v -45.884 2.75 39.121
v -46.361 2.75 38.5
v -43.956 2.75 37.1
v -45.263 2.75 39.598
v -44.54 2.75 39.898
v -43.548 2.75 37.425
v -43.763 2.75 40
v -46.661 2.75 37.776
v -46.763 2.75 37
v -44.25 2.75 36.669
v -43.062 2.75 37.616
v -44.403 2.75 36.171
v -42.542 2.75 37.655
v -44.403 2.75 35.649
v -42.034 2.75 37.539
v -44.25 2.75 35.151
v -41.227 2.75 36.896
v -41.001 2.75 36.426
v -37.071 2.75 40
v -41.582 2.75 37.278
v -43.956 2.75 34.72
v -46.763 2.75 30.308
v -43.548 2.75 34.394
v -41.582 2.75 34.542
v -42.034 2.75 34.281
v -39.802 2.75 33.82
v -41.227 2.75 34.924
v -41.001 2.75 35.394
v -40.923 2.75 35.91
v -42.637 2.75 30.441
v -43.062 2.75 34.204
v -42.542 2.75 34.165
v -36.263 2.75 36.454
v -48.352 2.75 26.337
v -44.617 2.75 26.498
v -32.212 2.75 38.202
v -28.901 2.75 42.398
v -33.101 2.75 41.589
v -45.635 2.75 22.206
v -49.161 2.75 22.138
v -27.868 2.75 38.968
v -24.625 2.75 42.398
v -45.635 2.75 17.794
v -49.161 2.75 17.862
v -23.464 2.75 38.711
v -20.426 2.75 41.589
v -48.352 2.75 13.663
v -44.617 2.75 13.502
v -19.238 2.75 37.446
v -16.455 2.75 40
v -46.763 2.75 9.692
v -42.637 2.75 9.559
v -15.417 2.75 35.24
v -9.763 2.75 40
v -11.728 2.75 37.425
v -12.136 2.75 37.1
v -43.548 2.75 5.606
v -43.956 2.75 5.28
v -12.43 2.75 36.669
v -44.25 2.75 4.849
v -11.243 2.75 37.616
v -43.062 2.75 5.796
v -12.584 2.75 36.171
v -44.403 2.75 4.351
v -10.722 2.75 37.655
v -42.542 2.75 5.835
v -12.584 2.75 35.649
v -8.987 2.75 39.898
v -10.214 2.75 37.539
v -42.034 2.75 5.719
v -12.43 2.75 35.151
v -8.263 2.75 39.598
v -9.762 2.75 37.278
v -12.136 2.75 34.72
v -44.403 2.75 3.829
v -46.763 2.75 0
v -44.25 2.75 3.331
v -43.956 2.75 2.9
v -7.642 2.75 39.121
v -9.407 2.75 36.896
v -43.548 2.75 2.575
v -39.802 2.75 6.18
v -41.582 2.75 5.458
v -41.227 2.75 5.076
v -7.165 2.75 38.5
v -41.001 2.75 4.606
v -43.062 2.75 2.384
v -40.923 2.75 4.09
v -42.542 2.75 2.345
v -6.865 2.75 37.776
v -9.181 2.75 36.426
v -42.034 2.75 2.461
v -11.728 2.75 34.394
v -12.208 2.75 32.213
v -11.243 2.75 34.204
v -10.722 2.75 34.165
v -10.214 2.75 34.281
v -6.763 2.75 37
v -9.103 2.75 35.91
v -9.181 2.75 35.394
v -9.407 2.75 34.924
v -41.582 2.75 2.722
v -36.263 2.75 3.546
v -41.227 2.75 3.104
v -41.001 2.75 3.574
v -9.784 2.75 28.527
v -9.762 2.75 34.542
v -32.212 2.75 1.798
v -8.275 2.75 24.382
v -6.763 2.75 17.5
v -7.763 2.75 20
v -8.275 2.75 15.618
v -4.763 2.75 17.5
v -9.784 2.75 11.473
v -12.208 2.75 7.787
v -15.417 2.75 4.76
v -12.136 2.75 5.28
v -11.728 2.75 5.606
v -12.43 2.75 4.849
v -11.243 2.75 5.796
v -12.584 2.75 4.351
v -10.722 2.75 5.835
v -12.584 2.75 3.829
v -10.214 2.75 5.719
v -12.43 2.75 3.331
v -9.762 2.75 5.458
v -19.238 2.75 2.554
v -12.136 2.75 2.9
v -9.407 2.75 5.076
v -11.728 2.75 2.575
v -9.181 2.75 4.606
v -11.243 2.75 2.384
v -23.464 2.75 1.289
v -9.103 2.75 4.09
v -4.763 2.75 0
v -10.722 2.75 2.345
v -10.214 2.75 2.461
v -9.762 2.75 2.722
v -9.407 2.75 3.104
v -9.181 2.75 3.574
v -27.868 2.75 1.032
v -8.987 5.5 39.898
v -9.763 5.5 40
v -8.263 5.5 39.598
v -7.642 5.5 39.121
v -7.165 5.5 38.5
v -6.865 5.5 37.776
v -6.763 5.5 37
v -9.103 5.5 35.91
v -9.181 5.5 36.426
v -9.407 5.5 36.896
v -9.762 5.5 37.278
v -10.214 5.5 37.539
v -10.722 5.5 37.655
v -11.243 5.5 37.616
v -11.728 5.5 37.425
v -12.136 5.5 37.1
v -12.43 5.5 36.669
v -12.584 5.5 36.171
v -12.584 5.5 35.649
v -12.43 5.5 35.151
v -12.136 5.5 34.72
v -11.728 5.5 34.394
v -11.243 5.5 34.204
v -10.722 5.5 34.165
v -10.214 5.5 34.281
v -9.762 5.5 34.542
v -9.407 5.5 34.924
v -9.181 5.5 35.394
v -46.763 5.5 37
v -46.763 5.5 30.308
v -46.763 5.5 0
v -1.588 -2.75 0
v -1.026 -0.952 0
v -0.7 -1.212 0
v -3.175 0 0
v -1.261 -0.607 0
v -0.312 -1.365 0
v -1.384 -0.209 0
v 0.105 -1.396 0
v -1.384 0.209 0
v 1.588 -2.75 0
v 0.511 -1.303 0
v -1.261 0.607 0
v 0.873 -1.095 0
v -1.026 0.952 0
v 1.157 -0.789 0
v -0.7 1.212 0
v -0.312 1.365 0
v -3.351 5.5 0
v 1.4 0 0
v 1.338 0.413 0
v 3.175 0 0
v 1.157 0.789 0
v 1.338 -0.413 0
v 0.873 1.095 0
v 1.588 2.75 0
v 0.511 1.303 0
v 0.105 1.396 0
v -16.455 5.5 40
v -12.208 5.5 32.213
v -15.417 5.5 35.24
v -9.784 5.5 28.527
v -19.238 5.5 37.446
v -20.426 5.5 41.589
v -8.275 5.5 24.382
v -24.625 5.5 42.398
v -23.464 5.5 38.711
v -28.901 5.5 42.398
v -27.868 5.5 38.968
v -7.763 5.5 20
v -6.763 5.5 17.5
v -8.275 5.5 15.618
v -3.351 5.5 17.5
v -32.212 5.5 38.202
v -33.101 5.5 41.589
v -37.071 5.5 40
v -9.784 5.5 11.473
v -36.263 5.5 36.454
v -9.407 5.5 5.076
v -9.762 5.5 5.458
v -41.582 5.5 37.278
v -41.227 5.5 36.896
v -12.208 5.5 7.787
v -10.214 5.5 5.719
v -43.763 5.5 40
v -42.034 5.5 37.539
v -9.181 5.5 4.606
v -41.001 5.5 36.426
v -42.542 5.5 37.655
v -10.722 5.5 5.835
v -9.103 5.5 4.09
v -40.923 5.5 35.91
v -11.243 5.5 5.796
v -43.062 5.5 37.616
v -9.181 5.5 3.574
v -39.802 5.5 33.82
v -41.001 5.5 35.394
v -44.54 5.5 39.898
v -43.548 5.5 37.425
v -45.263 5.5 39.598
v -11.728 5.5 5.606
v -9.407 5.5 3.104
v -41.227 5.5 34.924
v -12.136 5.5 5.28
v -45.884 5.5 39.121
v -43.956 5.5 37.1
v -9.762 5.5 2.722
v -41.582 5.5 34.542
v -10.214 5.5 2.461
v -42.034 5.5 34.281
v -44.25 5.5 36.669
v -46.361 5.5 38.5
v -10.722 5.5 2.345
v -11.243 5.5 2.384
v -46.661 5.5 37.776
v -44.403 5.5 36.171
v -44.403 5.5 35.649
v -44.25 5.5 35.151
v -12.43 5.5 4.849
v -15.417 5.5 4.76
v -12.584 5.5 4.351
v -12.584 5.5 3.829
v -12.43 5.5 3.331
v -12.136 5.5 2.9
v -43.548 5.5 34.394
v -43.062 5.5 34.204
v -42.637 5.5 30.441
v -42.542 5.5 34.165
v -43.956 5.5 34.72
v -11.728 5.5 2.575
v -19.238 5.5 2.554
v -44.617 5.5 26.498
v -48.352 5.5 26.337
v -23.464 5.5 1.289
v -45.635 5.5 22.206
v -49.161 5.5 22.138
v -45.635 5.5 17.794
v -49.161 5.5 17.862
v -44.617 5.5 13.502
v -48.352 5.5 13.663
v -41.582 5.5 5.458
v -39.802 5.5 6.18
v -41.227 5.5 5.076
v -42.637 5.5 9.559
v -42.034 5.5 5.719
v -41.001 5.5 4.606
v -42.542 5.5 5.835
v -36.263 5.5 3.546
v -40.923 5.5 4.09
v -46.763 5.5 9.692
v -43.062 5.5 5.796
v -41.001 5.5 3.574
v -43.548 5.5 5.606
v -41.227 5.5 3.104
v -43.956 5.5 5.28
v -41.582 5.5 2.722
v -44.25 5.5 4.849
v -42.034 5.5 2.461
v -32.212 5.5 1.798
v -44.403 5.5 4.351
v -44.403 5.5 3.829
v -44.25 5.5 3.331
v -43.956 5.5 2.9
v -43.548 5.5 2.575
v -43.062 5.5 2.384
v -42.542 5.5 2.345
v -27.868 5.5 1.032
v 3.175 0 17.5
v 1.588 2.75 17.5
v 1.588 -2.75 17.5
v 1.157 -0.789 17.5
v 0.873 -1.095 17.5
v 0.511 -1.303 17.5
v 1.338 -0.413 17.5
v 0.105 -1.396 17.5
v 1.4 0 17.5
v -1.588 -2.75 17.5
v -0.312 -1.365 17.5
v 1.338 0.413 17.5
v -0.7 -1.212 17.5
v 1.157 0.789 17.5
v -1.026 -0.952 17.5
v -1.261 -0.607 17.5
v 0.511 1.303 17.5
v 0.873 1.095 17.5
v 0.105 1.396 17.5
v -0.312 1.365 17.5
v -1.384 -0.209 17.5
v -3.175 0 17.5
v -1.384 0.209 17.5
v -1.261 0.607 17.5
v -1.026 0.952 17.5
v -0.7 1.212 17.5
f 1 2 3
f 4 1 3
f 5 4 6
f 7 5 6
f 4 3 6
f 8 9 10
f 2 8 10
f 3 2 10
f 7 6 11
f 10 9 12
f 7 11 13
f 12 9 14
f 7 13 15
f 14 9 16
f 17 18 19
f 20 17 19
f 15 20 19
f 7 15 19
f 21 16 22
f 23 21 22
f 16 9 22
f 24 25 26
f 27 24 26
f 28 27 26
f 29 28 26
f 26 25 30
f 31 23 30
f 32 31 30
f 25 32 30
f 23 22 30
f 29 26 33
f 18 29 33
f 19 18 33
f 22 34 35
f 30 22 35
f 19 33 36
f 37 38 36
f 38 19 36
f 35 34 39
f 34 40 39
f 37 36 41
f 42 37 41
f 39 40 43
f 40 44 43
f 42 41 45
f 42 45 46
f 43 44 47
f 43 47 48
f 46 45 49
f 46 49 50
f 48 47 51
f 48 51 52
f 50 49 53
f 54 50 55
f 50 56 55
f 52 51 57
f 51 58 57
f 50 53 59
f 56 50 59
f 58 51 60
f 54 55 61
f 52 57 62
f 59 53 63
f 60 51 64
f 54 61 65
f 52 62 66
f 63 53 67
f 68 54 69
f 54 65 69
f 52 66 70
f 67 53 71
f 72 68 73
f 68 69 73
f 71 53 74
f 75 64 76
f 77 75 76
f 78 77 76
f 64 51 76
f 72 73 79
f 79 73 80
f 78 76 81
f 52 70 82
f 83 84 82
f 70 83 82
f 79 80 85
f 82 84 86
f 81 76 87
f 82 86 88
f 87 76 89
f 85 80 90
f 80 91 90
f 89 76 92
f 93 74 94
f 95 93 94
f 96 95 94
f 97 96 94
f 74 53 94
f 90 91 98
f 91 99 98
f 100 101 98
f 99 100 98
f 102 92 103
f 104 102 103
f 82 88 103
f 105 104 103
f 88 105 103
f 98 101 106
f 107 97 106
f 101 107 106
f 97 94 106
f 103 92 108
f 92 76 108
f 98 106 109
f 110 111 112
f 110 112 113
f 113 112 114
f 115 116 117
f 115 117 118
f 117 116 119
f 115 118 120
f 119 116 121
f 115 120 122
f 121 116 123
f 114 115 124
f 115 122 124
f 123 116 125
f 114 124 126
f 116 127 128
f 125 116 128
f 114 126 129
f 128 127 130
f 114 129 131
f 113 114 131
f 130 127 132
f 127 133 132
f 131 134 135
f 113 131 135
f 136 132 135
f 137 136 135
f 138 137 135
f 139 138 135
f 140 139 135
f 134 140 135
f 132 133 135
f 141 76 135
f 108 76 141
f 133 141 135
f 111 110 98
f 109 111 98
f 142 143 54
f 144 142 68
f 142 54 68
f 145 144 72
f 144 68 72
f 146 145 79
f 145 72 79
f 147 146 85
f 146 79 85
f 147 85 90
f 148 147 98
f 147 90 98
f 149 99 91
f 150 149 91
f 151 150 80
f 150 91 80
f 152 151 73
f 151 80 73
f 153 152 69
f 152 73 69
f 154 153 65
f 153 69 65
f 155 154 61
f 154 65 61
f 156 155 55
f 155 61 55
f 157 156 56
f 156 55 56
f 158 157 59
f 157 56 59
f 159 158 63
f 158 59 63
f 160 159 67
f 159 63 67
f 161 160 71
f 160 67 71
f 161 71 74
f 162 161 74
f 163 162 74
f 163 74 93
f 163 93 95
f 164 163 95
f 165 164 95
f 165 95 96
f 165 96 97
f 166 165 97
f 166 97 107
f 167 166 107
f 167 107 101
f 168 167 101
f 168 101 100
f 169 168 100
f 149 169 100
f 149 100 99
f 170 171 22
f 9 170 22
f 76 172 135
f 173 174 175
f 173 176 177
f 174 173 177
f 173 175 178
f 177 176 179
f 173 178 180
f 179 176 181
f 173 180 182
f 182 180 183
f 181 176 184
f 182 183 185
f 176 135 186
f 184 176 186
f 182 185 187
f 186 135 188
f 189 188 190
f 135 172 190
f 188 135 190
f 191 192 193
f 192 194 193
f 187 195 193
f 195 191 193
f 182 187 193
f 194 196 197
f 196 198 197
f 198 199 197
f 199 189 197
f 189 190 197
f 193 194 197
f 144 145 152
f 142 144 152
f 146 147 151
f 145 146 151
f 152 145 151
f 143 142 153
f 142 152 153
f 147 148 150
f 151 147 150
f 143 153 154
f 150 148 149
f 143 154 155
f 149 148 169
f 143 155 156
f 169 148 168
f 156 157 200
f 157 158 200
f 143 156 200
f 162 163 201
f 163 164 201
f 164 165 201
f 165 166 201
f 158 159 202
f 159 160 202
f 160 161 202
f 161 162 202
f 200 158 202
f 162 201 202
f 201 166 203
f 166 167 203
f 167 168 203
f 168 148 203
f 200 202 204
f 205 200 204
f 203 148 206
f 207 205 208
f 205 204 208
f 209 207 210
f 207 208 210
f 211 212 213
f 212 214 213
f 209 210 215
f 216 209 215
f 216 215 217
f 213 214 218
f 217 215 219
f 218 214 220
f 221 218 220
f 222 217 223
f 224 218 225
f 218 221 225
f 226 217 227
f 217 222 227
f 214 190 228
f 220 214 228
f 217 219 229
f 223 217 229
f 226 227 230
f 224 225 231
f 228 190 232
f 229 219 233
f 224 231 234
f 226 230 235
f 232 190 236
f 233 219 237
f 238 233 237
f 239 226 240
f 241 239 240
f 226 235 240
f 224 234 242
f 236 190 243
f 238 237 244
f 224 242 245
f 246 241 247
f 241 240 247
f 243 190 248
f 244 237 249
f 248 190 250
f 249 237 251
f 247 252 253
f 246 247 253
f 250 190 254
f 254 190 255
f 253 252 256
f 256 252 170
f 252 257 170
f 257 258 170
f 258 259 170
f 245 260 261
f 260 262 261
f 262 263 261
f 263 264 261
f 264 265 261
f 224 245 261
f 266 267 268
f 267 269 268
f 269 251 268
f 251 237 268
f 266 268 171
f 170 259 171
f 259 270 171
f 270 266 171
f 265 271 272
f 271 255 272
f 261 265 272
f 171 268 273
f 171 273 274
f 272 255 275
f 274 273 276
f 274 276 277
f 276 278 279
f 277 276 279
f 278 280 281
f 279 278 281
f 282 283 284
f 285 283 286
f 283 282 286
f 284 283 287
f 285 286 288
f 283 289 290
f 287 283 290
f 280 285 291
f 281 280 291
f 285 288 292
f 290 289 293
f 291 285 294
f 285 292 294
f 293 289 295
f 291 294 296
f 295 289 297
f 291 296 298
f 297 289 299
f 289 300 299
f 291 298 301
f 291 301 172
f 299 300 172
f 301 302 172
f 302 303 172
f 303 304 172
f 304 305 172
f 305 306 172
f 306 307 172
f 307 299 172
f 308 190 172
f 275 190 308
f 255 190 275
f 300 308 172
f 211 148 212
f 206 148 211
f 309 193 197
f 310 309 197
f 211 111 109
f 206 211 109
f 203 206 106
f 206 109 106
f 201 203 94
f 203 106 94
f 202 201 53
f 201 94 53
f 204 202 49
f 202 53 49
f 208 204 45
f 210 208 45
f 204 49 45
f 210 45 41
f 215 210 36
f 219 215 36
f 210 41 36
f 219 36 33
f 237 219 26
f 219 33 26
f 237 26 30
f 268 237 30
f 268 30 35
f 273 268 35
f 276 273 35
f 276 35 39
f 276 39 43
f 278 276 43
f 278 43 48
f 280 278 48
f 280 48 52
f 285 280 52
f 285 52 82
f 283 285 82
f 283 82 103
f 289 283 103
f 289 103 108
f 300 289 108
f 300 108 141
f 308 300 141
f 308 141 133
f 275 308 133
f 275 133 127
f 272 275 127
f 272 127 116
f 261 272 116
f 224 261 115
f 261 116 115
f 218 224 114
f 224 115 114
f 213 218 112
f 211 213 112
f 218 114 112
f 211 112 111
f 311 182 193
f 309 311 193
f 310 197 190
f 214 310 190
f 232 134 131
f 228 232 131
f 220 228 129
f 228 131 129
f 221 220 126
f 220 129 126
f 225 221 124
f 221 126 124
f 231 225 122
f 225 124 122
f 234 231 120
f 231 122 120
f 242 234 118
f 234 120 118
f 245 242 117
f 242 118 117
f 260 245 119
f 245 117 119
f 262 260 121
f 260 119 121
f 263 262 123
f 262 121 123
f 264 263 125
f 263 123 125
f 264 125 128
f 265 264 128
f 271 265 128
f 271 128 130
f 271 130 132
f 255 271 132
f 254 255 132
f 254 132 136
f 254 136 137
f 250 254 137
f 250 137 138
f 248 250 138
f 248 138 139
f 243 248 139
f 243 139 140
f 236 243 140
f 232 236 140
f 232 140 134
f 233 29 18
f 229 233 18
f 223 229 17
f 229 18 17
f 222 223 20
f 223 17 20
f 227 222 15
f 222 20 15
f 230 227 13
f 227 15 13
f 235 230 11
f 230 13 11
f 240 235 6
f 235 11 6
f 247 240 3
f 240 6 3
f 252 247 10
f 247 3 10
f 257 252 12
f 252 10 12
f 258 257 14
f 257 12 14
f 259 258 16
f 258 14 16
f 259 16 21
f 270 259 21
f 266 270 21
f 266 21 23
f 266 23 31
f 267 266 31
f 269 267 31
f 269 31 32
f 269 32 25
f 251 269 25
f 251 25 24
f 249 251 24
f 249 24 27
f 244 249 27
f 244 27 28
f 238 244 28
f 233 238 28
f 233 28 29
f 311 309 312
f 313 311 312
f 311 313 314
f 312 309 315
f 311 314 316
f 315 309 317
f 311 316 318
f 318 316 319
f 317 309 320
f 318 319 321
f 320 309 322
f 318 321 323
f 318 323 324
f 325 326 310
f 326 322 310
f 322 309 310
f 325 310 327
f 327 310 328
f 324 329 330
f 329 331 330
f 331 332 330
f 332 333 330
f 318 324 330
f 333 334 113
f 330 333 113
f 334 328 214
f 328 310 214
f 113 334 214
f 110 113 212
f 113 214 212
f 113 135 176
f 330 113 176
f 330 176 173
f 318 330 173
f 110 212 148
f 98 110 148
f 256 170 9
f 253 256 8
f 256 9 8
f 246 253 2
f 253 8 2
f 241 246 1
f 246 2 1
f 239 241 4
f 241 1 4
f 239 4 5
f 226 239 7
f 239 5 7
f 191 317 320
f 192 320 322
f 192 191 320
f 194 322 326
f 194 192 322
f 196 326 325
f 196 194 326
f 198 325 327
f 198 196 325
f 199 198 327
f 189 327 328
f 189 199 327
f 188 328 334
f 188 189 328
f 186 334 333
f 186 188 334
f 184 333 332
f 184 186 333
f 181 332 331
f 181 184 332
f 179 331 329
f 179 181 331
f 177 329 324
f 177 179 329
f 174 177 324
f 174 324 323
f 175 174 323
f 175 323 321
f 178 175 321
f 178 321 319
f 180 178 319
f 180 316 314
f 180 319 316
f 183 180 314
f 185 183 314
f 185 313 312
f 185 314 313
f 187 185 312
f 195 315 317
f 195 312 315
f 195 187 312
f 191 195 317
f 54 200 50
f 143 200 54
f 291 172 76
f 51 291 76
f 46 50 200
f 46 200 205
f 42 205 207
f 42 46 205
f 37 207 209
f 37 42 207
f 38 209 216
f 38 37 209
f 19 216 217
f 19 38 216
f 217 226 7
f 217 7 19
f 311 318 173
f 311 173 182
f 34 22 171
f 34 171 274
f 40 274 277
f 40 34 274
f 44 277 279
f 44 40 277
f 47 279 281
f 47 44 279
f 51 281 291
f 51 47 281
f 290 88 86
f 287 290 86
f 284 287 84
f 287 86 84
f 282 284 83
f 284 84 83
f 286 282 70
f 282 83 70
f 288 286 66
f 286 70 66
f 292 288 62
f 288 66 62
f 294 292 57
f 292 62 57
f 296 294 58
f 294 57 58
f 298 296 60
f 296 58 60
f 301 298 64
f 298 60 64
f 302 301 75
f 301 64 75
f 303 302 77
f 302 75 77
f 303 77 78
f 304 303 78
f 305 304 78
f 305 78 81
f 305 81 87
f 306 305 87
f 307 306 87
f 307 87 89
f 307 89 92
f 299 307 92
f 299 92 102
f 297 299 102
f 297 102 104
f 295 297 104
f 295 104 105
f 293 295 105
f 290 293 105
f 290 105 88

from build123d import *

# Parameters (mm, degrees)
F0_R     = 1.4
F1_DEPTH = 40
F2_W     = 3.4122867597
F2_H     = 22.5
F3_DEPTH = 25
F5_DEPTH = 2.75
F4_R     = 1.75
F4_R_2   = 19
F6_DEPTH = 25


with BuildPart() as f1:
    # F0 (on Top) → F1 (new body)
    with BuildSketch(Plane.XY):
        Polygon((-1.5877132403, -2.75), (1.5877132403, -2.75), (3.17543, 0), (1.5877132403, 2.75), (-3.3508529611, 5.5), (-46.7631397208, 5.5), (-46.7631397208, 2.75), (-4.7631397208, 2.75), (-3.1754264805, 0), align=None)
        Circle(F0_R, mode=Mode.SUBTRACT)
    extrude(amount=F1_DEPTH)

    # F2 (on face) → F3 (cut)
    with BuildSketch(Plane(origin=(0, 5.5, 0), x_dir=(-1, 0, 0), z_dir=(0, 1, 0))):
        Polygon((6.7631397208, 40.8263410057), (-4.1816732138, 40.8263410057), (-4.1816732138, 17.5), (3.3508529611, 17.5), (3.3508529611, 40), (6.7631397208, 40), align=None)
        with Locations((5.056996341, 28.75)):
            Rectangle(F2_W, F2_H)
    extrude(amount=-F3_DEPTH, mode=Mode.SUBTRACT)

    # F4 (on face) → F5 (join)
    with BuildSketch(Plane.XZ.offset(-2.75)):
        with BuildLine():
            Line((-46.7631397208, 9.692235936), (-46.7631397208, 30.307764064))
            ThreePointArc((-46.7631397208, 30.307764064), (-49.2631397208, 20), (-46.7631397208, 9.692235936))
        make_face()
        with BuildLine():
            ThreePointArc((-16.4553756568, 40), (-26.7631397208, 42.5), (-37.0709037849, 40))
            Line((-37.0709037849, 40), (-16.4553756568, 40))
        make_face()
    extrude(amount=-F5_DEPTH)

    # F4 (on face) → F6 (cut)
    with BuildSketch(Plane.XZ.offset(-2.75)):
        with BuildLine():
            Line((-6.7631397208, 40), (-9.7631397208, 40))
            ThreePointArc((-9.7631397208, 40), (-7.6418193773, 39.1213203436), (-6.7631397208, 37))
            Line((-6.7631397208, 37), (-6.7631397208, 40))
        make_face()
        with BuildLine():
            ThreePointArc((-46.7631397208, 37), (-45.8844600644, 39.1213203436), (-43.7631397208, 40))
            Line((-43.7631397208, 40), (-46.7631397208, 40))
            Line((-46.7631397208, 40), (-46.7631397208, 37))
        make_face()
        with Locations((-42.6730422975, 35.9099025767)):
            Circle(F4_R)
        with Locations((-42.6730422975, 4.0900974233)):
            Circle(F4_R)
        with Locations((-10.8532371441, 4.0900974233)):
            Circle(F4_R)
        with Locations((-10.8532371441, 35.9099025767)):
            Circle(F4_R)
        with Locations((-26.7631397208, 20)):
            Circle(F4_R_2)
    extrude(amount=-F6_DEPTH, mode=Mode.SUBTRACT)


solid = f1.part
